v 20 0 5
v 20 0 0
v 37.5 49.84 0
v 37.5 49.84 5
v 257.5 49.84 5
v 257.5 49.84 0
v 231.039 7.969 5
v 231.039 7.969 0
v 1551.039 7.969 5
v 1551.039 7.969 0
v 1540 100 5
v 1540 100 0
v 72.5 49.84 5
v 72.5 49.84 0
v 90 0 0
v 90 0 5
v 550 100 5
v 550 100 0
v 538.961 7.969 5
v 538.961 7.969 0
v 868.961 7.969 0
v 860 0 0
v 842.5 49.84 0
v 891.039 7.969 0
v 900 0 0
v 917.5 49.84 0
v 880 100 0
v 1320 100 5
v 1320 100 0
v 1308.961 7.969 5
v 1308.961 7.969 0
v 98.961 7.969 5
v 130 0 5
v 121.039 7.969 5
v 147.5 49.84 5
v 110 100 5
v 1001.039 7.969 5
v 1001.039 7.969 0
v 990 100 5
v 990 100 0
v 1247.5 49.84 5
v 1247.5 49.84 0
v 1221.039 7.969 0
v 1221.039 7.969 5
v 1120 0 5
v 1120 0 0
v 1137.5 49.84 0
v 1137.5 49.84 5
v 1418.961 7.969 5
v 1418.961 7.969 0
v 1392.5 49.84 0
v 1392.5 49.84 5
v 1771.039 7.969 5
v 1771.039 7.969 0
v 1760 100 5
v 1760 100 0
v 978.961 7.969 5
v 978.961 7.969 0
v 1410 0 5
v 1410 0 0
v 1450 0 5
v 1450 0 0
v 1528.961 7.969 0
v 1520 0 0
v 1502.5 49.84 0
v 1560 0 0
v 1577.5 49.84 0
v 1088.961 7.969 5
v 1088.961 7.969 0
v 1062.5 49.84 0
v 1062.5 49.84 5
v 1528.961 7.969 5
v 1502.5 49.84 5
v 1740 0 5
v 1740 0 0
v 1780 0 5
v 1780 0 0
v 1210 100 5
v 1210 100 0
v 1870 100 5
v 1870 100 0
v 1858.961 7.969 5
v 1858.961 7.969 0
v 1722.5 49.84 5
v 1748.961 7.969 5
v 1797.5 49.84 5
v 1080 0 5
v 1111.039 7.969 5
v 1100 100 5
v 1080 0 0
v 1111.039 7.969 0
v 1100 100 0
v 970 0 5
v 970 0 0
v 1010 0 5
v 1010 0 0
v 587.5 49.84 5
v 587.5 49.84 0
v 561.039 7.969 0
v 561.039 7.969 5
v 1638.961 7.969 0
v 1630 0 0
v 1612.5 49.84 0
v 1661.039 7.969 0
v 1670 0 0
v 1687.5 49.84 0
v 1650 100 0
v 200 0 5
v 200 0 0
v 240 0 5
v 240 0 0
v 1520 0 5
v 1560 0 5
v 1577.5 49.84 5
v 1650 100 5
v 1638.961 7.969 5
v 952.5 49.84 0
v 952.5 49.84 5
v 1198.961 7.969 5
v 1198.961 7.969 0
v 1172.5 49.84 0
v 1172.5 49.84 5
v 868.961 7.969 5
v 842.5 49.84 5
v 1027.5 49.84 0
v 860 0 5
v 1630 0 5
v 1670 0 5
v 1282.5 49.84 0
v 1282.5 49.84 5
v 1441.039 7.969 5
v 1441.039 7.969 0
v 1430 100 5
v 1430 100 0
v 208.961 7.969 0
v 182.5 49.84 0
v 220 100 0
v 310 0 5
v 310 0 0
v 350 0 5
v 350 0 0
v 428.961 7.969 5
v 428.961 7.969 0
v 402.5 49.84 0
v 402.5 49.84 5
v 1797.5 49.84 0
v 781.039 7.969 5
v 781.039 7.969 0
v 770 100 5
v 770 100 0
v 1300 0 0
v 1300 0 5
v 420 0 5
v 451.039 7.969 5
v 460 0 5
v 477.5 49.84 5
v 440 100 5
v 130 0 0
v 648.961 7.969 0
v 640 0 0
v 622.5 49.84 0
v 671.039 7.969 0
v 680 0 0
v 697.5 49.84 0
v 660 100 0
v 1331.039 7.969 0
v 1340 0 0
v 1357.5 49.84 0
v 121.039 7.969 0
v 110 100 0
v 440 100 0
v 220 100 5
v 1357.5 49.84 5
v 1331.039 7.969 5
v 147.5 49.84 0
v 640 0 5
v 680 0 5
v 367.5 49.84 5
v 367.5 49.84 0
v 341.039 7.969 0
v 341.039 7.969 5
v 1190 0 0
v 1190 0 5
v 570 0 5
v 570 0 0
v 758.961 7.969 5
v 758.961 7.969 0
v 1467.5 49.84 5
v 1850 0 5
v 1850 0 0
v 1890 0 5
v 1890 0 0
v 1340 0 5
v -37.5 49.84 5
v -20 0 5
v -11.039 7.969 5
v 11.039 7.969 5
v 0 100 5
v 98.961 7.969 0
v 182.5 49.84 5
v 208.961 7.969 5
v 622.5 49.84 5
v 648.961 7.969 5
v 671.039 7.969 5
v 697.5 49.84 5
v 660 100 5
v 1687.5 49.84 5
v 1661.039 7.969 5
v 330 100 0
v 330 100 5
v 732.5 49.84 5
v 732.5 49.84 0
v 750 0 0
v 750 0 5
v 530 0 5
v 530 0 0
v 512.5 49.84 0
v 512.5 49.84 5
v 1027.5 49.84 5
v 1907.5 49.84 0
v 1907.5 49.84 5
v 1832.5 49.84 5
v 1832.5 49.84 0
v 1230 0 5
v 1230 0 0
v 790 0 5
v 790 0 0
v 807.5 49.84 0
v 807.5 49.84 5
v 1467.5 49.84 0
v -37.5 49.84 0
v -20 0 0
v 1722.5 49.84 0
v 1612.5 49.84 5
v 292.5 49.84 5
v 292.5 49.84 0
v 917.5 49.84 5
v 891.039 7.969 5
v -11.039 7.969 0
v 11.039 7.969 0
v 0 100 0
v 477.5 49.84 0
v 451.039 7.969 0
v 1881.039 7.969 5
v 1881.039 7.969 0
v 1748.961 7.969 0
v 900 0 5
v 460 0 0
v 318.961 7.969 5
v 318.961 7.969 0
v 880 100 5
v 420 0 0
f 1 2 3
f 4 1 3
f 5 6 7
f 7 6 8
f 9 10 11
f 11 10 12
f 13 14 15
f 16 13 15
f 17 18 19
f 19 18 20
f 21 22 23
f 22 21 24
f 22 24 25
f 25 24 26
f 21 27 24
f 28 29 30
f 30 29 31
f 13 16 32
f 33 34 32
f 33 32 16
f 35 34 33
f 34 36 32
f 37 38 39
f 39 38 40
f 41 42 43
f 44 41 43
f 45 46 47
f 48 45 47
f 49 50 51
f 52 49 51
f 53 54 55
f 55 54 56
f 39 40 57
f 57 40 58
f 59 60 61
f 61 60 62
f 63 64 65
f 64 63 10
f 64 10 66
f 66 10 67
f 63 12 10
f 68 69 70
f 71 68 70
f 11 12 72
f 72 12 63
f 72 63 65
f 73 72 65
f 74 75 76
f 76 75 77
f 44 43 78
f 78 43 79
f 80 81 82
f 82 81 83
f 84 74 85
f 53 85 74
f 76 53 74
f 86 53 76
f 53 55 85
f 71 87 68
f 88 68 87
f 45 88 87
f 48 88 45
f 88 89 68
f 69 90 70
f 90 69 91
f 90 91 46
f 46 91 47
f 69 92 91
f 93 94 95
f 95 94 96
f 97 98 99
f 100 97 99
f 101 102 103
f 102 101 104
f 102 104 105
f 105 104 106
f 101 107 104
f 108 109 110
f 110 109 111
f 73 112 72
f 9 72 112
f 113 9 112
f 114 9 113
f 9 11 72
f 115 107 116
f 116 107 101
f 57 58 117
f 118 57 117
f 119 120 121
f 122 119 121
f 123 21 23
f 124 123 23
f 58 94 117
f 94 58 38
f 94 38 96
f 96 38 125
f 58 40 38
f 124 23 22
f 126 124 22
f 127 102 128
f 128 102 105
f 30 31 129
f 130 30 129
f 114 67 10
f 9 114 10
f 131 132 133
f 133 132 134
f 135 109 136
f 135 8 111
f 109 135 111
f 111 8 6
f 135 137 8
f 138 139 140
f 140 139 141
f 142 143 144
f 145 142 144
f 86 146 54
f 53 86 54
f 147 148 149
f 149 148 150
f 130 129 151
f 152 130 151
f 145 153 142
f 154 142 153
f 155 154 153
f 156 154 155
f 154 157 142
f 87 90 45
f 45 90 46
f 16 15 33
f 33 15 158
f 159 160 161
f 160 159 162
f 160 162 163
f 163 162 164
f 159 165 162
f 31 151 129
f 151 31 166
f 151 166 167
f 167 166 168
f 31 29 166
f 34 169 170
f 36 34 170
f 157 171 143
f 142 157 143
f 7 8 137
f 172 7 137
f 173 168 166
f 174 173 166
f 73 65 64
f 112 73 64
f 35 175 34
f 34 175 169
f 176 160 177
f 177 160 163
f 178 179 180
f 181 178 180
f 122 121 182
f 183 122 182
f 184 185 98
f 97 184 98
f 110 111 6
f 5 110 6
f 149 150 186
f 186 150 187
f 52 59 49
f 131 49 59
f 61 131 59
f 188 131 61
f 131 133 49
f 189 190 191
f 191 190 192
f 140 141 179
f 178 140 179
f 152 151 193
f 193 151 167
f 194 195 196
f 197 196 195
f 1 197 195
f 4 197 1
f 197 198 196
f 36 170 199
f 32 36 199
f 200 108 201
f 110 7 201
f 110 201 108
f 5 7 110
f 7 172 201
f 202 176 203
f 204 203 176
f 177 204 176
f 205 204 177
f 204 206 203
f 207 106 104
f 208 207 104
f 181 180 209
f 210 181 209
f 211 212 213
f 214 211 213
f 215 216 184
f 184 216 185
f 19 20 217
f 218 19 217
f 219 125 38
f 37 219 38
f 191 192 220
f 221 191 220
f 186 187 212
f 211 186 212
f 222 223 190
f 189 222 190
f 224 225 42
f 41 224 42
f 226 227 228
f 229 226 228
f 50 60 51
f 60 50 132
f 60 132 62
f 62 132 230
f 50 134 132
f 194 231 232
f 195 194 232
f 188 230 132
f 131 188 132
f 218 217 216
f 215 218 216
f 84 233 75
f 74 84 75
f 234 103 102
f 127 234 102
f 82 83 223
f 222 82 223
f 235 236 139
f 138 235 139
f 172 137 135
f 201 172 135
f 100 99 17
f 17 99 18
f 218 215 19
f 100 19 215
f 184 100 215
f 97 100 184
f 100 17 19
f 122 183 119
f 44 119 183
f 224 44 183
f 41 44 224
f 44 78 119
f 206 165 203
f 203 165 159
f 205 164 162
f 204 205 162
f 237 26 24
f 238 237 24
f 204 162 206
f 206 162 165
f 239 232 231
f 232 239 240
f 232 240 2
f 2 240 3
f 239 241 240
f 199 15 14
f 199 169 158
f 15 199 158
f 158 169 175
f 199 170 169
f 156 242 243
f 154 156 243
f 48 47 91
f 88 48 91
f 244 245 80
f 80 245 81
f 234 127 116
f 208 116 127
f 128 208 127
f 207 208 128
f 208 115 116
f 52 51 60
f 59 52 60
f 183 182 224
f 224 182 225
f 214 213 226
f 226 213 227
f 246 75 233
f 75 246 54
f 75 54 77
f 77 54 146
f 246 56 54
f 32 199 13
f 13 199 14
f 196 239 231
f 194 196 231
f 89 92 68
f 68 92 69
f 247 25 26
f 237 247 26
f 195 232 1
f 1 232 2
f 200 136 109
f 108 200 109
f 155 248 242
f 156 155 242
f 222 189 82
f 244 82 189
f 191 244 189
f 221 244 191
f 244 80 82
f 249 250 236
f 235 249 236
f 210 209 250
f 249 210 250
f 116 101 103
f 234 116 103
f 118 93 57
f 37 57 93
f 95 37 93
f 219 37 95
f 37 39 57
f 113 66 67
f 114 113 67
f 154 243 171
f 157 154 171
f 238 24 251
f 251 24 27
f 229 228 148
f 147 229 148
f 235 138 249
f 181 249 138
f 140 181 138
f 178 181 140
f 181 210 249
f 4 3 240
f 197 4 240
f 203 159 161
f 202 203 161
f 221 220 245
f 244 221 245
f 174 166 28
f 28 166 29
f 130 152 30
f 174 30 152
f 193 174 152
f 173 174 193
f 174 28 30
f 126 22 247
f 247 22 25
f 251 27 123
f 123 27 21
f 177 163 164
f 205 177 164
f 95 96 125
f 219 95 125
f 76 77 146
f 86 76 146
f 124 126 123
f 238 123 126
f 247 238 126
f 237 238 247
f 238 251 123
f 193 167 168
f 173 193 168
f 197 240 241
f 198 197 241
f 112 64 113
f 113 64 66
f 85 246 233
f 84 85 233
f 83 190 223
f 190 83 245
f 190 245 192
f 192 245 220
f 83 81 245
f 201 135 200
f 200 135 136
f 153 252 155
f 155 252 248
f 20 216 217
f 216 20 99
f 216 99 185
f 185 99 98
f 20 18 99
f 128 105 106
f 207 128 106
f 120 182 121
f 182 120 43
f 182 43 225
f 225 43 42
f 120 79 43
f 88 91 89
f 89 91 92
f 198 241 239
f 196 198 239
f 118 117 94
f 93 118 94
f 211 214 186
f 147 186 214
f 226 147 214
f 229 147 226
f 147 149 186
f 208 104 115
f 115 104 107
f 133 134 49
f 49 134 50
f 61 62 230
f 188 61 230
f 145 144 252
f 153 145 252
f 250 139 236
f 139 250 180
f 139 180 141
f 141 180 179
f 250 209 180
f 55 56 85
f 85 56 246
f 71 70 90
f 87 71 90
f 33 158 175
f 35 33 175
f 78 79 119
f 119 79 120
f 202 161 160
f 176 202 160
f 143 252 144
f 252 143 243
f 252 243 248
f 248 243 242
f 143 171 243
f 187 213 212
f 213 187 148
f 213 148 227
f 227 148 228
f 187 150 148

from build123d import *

# Parameters (mm, degrees)
F1_DEPTH = 5


with BuildPart() as f1:
    # F0 (on Top) → F1 (new body)
    with BuildSketch(Plane.XY):
        Polygon((-20, 0), (0, 0), (20, 0), (37.5, 49.839769), (11.039143, 7.96875), (0, 100), (-11.039143, 7.96875), (-37.5, 49.839769), align=None)
        Polygon((98.960857, 7.96875), (72.5, 49.839769), (90, 0), (110, 0), (130, 0), (147.5, 49.839769), (121.039143, 7.96875), (110, 100), align=None)
        Polygon((208.960857, 7.96875), (182.5, 49.839769), (200, 0), (220, 0), (240, 0), (257.5, 49.839769), (231.039143, 7.96875), (220, 100), align=None)
        Polygon((318.960857, 7.96875), (292.5, 49.839769), (310, 0), (330, 0), (350, 0), (367.5, 49.839769), (341.039143, 7.96875), (330, 100), align=None)
        Polygon((428.960857, 7.96875), (402.5, 49.839769), (420, 0), (440, 0), (460, 0), (477.5, 49.839769), (451.039143, 7.96875), (440, 100), align=None)
        Polygon((538.960857, 7.96875), (512.5, 49.839769), (530, 0), (550, 0), (570, 0), (587.5, 49.839769), (561.039143, 7.96875), (550, 100), align=None)
        Polygon((648.960857, 7.96875), (622.5, 49.839769), (640, 0), (660, 0), (680, 0), (697.5, 49.839769), (671.039143, 7.96875), (660, 100), align=None)
        Polygon((758.960857, 7.96875), (732.5, 49.839769), (750, 0), (770, 0), (790, 0), (807.5, 49.839769), (781.039143, 7.96875), (770, 100), align=None)
        Polygon((868.960857, 7.96875), (842.5, 49.839769), (860, 0), (880, 0), (900, 0), (917.5, 49.839769), (891.039143, 7.96875), (880, 100), align=None)
        Polygon((978.960857, 7.96875), (952.5, 49.839769), (970, 0), (990, 0), (1010, 0), (1027.5, 49.839769), (1001.039143, 7.96875), (990, 100), align=None)
        Polygon((1088.960857, 7.96875), (1062.5, 49.839769), (1080, 0), (1100, 0), (1120, 0), (1137.5, 49.839769), (1111.039143, 7.96875), (1100, 100), align=None)
        Polygon((1198.960857, 7.96875), (1172.5, 49.839769), (1190, 0), (1210, 0), (1230, 0), (1247.5, 49.839769), (1221.039143, 7.96875), (1210, 100), align=None)
        Polygon((1308.960857, 7.96875), (1282.5, 49.839769), (1300, 0), (1320, 0), (1340, 0), (1357.5, 49.839769), (1331.039143, 7.96875), (1320, 100), align=None)
        Polygon((1418.960857, 7.96875), (1392.5, 49.839769), (1410, 0), (1430, 0), (1450, 0), (1467.5, 49.839769), (1441.039143, 7.96875), (1430, 100), align=None)
        Polygon((1528.960857, 7.96875), (1502.5, 49.839769), (1520, 0), (1540, 0), (1560, 0), (1577.5, 49.839769), (1551.039143, 7.96875), (1540, 100), align=None)
        Polygon((1638.960857, 7.96875), (1612.5, 49.839769), (1630, 0), (1650, 0), (1670, 0), (1687.5, 49.839769), (1661.039143, 7.96875), (1650, 100), align=None)
        Polygon((1748.960857, 7.96875), (1722.5, 49.839769), (1740, 0), (1760, 0), (1780, 0), (1797.5, 49.839769), (1771.039143, 7.96875), (1760, 100), align=None)
        Polygon((1858.960857, 7.96875), (1832.5, 49.839769), (1850, 0), (1870, 0), (1890, 0), (1907.5, 49.839769), (1881.039143, 7.96875), (1870, 100), align=None)
    extrude(amount=F1_DEPTH)


solid = f1.part
